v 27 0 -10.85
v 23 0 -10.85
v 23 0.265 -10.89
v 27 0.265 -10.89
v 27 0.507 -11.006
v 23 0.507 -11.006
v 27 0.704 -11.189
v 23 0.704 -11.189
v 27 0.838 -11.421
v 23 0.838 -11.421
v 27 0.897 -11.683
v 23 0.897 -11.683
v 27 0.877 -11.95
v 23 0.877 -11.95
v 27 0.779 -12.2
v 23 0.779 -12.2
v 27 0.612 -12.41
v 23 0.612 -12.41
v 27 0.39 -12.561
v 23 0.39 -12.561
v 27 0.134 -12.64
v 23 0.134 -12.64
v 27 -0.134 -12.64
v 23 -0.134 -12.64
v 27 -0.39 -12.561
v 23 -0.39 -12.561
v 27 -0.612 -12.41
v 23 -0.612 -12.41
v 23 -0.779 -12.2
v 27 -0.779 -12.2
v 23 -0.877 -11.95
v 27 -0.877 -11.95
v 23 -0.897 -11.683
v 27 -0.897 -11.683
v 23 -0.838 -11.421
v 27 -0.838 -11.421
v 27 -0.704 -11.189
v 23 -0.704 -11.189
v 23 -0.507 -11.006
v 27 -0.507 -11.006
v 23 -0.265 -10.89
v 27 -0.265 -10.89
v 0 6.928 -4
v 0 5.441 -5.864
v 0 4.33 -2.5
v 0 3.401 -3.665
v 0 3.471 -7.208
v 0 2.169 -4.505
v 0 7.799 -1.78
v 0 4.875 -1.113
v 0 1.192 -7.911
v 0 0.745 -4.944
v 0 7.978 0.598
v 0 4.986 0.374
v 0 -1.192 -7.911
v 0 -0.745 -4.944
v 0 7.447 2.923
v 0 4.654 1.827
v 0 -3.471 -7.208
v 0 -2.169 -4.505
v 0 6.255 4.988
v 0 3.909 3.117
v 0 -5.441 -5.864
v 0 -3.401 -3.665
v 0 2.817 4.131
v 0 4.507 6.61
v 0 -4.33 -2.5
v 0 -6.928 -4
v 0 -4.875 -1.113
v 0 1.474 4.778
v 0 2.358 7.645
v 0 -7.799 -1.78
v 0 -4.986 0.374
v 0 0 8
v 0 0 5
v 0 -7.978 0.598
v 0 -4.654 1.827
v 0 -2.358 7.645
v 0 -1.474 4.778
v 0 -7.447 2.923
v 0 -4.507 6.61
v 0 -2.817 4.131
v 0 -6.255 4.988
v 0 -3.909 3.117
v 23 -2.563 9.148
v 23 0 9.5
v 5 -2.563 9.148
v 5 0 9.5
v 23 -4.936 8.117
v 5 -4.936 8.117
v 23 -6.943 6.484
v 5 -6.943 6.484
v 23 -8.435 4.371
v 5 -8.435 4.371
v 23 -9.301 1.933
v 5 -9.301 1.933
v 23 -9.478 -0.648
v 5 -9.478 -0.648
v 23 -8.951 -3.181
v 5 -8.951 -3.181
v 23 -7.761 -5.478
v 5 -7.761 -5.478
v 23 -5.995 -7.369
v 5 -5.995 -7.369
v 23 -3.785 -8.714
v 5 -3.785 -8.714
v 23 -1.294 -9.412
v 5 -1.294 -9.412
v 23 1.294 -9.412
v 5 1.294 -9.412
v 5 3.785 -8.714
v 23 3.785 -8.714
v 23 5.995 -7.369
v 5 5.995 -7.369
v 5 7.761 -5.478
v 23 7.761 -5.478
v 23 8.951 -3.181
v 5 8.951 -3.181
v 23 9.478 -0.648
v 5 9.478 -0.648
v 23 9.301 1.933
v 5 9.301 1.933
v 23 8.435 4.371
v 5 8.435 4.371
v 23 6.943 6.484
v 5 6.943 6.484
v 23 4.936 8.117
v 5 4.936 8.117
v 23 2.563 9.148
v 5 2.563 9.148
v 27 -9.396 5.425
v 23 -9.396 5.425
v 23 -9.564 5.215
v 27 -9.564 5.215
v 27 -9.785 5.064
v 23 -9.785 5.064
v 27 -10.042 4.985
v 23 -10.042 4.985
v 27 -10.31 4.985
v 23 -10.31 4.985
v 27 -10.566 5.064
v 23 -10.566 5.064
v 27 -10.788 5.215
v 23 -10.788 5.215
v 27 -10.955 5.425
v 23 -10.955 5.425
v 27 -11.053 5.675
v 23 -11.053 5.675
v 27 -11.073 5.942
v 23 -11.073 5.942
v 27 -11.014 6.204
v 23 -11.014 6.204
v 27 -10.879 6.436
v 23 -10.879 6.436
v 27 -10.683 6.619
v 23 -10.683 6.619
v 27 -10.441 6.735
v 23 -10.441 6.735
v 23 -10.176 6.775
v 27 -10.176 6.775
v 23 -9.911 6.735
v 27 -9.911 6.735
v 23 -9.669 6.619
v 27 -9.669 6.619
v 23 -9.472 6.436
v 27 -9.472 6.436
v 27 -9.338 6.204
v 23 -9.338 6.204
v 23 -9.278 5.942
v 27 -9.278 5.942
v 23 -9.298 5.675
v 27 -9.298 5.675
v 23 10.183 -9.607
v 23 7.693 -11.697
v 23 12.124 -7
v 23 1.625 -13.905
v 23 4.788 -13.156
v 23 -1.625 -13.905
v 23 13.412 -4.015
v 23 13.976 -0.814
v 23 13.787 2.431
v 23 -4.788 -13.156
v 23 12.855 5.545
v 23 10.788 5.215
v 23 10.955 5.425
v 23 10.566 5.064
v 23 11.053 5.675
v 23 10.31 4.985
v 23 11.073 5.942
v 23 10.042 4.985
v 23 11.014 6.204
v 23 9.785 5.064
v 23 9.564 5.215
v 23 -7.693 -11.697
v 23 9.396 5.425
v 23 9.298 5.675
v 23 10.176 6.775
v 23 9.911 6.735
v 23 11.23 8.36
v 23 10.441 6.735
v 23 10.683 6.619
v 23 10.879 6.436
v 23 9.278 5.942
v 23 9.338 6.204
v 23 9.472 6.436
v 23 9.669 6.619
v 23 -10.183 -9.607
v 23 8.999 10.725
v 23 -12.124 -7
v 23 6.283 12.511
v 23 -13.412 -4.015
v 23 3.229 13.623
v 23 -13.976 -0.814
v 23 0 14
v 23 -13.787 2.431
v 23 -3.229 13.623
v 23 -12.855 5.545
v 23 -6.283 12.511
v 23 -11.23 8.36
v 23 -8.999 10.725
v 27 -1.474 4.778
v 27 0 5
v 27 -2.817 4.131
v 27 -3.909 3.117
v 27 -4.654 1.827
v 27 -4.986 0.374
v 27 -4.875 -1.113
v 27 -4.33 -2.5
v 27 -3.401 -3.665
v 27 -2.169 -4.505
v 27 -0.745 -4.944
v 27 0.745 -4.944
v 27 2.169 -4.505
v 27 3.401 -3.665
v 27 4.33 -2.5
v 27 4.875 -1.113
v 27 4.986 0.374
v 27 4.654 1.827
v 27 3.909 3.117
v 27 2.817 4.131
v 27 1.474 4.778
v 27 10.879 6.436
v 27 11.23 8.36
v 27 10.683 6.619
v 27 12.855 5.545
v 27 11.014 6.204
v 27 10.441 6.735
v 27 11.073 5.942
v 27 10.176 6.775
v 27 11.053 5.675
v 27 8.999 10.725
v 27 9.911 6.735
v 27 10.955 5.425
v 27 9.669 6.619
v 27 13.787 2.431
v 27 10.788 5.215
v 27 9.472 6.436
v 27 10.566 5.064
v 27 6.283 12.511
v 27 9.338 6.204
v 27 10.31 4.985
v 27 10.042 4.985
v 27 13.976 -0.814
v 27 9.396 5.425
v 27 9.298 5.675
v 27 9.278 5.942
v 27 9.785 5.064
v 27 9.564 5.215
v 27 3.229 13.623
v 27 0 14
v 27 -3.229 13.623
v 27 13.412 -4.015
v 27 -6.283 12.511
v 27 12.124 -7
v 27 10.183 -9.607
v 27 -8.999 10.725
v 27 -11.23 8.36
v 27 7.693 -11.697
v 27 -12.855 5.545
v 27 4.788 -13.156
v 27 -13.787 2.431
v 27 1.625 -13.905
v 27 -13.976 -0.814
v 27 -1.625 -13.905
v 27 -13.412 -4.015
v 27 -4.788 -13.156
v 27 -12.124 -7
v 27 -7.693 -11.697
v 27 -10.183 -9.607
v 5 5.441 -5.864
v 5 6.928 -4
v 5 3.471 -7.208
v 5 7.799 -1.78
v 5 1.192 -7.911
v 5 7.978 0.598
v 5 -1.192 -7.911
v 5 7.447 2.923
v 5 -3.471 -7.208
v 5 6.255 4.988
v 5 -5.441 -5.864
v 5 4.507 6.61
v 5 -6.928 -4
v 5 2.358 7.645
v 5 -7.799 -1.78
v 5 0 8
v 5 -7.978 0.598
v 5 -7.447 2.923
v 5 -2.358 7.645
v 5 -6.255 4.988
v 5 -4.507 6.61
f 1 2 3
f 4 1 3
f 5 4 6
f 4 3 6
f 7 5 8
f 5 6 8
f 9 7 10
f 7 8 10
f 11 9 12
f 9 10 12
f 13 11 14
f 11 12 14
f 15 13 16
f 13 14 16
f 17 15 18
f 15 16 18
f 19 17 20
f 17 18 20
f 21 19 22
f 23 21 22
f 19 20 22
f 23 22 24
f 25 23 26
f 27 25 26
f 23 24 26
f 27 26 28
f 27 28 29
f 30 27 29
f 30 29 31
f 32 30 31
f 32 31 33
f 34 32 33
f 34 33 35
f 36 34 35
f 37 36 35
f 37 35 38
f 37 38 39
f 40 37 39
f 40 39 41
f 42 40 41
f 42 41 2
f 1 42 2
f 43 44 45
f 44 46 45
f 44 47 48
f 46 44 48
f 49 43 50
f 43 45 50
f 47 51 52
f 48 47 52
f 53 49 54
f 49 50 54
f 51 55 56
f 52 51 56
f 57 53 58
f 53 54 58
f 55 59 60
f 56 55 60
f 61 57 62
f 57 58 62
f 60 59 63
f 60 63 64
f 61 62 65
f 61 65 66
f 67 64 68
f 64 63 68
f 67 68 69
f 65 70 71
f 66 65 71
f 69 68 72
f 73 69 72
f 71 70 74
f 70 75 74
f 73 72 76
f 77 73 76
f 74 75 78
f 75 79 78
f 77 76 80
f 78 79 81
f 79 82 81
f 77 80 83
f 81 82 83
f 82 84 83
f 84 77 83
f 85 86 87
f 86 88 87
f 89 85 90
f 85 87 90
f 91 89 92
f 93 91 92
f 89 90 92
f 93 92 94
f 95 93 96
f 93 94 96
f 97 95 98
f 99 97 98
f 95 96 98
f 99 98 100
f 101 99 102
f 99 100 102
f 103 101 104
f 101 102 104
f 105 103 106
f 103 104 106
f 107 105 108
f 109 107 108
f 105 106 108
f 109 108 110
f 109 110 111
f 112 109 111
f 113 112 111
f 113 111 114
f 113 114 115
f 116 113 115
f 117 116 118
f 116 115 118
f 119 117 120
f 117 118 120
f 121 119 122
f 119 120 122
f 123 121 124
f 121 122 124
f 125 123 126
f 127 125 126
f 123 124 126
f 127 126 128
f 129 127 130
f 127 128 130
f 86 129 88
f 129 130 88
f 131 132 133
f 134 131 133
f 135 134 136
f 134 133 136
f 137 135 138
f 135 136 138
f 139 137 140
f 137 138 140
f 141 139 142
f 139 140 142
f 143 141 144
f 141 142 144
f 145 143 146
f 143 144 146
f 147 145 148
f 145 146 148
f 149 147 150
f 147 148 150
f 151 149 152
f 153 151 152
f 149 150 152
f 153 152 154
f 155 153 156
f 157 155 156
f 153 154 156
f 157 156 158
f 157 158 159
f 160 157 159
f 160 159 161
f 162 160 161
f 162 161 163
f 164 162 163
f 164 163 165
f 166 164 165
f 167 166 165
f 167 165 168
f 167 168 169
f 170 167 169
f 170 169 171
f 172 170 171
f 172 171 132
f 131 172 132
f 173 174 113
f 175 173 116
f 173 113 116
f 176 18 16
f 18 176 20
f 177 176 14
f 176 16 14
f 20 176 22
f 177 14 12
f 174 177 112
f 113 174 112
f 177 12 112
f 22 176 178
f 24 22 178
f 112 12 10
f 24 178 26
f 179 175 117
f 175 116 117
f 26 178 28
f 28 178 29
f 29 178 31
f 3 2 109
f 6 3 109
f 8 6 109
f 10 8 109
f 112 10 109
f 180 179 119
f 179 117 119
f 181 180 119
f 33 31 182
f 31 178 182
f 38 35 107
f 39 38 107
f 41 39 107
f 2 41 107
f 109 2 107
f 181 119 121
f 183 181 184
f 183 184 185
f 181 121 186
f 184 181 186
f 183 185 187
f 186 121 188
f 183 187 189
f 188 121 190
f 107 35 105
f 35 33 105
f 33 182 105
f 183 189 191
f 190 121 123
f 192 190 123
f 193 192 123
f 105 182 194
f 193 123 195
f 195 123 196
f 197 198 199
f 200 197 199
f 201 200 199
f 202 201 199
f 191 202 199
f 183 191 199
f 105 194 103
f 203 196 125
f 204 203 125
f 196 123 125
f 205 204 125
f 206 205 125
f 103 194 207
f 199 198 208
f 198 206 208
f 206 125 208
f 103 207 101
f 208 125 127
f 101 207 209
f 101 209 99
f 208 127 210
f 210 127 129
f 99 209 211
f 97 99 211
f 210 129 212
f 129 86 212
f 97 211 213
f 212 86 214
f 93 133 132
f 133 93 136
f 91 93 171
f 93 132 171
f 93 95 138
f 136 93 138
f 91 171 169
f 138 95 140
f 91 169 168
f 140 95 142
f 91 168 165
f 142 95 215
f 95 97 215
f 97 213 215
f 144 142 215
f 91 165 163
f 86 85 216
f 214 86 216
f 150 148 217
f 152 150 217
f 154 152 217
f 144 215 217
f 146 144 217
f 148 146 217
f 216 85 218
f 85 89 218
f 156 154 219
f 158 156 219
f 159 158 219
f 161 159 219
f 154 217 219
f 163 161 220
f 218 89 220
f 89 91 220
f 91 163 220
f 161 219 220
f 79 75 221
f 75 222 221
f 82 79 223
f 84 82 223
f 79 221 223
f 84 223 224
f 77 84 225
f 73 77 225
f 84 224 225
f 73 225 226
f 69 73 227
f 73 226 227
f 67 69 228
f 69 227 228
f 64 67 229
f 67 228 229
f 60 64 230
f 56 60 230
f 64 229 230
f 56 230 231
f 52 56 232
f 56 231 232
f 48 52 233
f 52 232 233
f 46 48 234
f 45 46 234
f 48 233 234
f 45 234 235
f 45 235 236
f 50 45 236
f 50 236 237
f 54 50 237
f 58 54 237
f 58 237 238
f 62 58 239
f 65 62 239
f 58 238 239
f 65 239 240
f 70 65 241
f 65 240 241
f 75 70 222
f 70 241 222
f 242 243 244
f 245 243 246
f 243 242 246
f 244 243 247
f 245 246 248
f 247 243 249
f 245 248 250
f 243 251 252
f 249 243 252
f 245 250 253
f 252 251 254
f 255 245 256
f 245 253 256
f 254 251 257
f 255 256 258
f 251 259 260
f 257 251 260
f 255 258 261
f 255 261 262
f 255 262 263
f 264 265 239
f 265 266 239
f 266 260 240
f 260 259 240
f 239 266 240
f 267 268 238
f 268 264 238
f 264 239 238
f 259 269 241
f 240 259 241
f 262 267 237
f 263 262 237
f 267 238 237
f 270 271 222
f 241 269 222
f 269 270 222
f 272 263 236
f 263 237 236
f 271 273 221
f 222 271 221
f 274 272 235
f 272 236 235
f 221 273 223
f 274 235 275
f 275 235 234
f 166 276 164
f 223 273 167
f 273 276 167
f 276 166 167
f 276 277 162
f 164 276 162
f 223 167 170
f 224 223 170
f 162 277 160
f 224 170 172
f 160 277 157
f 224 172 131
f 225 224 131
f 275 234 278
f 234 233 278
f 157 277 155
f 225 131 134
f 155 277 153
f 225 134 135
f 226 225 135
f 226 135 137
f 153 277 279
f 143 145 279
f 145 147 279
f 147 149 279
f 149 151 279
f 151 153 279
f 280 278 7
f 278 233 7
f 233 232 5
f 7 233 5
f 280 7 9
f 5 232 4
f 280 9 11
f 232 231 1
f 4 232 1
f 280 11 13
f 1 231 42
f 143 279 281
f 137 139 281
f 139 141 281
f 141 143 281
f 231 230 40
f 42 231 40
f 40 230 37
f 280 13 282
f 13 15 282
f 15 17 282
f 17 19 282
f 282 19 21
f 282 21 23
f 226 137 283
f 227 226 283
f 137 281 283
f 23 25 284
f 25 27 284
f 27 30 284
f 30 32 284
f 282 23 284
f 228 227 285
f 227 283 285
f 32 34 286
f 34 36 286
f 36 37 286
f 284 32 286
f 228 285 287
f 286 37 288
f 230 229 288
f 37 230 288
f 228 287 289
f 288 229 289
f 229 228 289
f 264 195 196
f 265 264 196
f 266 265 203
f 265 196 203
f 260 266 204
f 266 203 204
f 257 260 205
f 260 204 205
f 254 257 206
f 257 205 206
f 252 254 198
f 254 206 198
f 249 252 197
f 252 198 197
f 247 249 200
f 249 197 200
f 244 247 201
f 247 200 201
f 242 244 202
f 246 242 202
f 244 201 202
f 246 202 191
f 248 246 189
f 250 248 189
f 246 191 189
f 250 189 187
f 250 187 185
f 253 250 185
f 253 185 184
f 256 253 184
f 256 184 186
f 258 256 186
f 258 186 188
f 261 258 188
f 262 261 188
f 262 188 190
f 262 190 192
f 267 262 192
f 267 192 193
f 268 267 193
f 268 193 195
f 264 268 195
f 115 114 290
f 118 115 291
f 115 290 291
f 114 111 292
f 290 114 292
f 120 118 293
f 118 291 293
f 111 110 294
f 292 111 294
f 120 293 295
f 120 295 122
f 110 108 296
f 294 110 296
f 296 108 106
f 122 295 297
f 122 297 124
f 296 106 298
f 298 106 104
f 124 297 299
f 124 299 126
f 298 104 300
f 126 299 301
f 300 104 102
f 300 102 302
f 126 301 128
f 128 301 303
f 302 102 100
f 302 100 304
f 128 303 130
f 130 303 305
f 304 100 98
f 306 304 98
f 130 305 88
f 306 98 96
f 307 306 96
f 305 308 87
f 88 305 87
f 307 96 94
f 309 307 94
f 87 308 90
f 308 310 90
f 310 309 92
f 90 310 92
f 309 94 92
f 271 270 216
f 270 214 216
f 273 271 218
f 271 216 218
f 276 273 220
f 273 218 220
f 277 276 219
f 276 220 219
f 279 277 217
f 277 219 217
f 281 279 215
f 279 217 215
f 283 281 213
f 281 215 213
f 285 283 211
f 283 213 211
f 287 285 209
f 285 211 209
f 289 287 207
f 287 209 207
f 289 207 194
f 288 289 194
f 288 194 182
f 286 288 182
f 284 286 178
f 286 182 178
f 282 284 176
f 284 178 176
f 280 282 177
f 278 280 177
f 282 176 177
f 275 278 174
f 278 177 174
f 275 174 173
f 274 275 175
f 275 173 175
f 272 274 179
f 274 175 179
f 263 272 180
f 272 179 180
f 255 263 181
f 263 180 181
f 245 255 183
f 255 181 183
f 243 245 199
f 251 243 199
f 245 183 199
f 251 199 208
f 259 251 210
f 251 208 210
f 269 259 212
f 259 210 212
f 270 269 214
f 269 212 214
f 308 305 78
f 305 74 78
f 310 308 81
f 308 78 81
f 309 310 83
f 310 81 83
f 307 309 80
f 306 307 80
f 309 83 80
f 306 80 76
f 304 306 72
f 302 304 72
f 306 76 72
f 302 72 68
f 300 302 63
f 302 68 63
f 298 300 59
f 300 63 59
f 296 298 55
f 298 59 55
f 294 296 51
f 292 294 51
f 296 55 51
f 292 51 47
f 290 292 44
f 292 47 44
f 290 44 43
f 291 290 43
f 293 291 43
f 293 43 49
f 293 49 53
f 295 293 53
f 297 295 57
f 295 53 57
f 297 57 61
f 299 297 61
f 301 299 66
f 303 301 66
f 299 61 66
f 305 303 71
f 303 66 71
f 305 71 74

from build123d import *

# Parameters (mm, degrees)
SKETCH2_R          = 0.9
CUT_EXTRUDE1_DEPTH = 31.347981811
CIRPATTERN1_COUNT  = 3


with BuildPart() as part:
    # Sketch1 → Revolve1 (revolve)
    with BuildSketch(Plane(origin=(0, 0, 0), x_dir=(1, 0, 0), z_dir=(0, 1, 0)), mode=Mode.PRIVATE) as revolve1_sk:
        Polygon((0, 5), (27, 5), (27, 14), (23, 14), (23, 9.5), (5, 9.5), (5, 8), (0, 8), align=None)
    revolve(revolve1_sk.sketch.rotate(Axis((0, 0, 0), (1, 0, 0)), 180), axis=Axis((0, 0, 0), (1, 0, 0)))

    # Sketch2 → Cut-Extrude1 (cut, through all)
    with BuildSketch(Plane.ZY.offset(-23)):
        with Locations((-11.75, 0)):
            Circle(SKETCH2_R)
    cut_extrude1 = extrude(amount=-CUT_EXTRUDE1_DEPTH, mode=Mode.SUBTRACT)

    # CirPattern1: Cut-Extrude1 ×3 about axis
    cirpattern1_axis = Axis((0, 0, 0), (1, 0, 0))
    for i in range(1, CIRPATTERN1_COUNT):
        add(cut_extrude1.rotate(cirpattern1_axis, i * 360 / CIRPATTERN1_COUNT), mode=Mode.SUBTRACT)


solid = part.part
